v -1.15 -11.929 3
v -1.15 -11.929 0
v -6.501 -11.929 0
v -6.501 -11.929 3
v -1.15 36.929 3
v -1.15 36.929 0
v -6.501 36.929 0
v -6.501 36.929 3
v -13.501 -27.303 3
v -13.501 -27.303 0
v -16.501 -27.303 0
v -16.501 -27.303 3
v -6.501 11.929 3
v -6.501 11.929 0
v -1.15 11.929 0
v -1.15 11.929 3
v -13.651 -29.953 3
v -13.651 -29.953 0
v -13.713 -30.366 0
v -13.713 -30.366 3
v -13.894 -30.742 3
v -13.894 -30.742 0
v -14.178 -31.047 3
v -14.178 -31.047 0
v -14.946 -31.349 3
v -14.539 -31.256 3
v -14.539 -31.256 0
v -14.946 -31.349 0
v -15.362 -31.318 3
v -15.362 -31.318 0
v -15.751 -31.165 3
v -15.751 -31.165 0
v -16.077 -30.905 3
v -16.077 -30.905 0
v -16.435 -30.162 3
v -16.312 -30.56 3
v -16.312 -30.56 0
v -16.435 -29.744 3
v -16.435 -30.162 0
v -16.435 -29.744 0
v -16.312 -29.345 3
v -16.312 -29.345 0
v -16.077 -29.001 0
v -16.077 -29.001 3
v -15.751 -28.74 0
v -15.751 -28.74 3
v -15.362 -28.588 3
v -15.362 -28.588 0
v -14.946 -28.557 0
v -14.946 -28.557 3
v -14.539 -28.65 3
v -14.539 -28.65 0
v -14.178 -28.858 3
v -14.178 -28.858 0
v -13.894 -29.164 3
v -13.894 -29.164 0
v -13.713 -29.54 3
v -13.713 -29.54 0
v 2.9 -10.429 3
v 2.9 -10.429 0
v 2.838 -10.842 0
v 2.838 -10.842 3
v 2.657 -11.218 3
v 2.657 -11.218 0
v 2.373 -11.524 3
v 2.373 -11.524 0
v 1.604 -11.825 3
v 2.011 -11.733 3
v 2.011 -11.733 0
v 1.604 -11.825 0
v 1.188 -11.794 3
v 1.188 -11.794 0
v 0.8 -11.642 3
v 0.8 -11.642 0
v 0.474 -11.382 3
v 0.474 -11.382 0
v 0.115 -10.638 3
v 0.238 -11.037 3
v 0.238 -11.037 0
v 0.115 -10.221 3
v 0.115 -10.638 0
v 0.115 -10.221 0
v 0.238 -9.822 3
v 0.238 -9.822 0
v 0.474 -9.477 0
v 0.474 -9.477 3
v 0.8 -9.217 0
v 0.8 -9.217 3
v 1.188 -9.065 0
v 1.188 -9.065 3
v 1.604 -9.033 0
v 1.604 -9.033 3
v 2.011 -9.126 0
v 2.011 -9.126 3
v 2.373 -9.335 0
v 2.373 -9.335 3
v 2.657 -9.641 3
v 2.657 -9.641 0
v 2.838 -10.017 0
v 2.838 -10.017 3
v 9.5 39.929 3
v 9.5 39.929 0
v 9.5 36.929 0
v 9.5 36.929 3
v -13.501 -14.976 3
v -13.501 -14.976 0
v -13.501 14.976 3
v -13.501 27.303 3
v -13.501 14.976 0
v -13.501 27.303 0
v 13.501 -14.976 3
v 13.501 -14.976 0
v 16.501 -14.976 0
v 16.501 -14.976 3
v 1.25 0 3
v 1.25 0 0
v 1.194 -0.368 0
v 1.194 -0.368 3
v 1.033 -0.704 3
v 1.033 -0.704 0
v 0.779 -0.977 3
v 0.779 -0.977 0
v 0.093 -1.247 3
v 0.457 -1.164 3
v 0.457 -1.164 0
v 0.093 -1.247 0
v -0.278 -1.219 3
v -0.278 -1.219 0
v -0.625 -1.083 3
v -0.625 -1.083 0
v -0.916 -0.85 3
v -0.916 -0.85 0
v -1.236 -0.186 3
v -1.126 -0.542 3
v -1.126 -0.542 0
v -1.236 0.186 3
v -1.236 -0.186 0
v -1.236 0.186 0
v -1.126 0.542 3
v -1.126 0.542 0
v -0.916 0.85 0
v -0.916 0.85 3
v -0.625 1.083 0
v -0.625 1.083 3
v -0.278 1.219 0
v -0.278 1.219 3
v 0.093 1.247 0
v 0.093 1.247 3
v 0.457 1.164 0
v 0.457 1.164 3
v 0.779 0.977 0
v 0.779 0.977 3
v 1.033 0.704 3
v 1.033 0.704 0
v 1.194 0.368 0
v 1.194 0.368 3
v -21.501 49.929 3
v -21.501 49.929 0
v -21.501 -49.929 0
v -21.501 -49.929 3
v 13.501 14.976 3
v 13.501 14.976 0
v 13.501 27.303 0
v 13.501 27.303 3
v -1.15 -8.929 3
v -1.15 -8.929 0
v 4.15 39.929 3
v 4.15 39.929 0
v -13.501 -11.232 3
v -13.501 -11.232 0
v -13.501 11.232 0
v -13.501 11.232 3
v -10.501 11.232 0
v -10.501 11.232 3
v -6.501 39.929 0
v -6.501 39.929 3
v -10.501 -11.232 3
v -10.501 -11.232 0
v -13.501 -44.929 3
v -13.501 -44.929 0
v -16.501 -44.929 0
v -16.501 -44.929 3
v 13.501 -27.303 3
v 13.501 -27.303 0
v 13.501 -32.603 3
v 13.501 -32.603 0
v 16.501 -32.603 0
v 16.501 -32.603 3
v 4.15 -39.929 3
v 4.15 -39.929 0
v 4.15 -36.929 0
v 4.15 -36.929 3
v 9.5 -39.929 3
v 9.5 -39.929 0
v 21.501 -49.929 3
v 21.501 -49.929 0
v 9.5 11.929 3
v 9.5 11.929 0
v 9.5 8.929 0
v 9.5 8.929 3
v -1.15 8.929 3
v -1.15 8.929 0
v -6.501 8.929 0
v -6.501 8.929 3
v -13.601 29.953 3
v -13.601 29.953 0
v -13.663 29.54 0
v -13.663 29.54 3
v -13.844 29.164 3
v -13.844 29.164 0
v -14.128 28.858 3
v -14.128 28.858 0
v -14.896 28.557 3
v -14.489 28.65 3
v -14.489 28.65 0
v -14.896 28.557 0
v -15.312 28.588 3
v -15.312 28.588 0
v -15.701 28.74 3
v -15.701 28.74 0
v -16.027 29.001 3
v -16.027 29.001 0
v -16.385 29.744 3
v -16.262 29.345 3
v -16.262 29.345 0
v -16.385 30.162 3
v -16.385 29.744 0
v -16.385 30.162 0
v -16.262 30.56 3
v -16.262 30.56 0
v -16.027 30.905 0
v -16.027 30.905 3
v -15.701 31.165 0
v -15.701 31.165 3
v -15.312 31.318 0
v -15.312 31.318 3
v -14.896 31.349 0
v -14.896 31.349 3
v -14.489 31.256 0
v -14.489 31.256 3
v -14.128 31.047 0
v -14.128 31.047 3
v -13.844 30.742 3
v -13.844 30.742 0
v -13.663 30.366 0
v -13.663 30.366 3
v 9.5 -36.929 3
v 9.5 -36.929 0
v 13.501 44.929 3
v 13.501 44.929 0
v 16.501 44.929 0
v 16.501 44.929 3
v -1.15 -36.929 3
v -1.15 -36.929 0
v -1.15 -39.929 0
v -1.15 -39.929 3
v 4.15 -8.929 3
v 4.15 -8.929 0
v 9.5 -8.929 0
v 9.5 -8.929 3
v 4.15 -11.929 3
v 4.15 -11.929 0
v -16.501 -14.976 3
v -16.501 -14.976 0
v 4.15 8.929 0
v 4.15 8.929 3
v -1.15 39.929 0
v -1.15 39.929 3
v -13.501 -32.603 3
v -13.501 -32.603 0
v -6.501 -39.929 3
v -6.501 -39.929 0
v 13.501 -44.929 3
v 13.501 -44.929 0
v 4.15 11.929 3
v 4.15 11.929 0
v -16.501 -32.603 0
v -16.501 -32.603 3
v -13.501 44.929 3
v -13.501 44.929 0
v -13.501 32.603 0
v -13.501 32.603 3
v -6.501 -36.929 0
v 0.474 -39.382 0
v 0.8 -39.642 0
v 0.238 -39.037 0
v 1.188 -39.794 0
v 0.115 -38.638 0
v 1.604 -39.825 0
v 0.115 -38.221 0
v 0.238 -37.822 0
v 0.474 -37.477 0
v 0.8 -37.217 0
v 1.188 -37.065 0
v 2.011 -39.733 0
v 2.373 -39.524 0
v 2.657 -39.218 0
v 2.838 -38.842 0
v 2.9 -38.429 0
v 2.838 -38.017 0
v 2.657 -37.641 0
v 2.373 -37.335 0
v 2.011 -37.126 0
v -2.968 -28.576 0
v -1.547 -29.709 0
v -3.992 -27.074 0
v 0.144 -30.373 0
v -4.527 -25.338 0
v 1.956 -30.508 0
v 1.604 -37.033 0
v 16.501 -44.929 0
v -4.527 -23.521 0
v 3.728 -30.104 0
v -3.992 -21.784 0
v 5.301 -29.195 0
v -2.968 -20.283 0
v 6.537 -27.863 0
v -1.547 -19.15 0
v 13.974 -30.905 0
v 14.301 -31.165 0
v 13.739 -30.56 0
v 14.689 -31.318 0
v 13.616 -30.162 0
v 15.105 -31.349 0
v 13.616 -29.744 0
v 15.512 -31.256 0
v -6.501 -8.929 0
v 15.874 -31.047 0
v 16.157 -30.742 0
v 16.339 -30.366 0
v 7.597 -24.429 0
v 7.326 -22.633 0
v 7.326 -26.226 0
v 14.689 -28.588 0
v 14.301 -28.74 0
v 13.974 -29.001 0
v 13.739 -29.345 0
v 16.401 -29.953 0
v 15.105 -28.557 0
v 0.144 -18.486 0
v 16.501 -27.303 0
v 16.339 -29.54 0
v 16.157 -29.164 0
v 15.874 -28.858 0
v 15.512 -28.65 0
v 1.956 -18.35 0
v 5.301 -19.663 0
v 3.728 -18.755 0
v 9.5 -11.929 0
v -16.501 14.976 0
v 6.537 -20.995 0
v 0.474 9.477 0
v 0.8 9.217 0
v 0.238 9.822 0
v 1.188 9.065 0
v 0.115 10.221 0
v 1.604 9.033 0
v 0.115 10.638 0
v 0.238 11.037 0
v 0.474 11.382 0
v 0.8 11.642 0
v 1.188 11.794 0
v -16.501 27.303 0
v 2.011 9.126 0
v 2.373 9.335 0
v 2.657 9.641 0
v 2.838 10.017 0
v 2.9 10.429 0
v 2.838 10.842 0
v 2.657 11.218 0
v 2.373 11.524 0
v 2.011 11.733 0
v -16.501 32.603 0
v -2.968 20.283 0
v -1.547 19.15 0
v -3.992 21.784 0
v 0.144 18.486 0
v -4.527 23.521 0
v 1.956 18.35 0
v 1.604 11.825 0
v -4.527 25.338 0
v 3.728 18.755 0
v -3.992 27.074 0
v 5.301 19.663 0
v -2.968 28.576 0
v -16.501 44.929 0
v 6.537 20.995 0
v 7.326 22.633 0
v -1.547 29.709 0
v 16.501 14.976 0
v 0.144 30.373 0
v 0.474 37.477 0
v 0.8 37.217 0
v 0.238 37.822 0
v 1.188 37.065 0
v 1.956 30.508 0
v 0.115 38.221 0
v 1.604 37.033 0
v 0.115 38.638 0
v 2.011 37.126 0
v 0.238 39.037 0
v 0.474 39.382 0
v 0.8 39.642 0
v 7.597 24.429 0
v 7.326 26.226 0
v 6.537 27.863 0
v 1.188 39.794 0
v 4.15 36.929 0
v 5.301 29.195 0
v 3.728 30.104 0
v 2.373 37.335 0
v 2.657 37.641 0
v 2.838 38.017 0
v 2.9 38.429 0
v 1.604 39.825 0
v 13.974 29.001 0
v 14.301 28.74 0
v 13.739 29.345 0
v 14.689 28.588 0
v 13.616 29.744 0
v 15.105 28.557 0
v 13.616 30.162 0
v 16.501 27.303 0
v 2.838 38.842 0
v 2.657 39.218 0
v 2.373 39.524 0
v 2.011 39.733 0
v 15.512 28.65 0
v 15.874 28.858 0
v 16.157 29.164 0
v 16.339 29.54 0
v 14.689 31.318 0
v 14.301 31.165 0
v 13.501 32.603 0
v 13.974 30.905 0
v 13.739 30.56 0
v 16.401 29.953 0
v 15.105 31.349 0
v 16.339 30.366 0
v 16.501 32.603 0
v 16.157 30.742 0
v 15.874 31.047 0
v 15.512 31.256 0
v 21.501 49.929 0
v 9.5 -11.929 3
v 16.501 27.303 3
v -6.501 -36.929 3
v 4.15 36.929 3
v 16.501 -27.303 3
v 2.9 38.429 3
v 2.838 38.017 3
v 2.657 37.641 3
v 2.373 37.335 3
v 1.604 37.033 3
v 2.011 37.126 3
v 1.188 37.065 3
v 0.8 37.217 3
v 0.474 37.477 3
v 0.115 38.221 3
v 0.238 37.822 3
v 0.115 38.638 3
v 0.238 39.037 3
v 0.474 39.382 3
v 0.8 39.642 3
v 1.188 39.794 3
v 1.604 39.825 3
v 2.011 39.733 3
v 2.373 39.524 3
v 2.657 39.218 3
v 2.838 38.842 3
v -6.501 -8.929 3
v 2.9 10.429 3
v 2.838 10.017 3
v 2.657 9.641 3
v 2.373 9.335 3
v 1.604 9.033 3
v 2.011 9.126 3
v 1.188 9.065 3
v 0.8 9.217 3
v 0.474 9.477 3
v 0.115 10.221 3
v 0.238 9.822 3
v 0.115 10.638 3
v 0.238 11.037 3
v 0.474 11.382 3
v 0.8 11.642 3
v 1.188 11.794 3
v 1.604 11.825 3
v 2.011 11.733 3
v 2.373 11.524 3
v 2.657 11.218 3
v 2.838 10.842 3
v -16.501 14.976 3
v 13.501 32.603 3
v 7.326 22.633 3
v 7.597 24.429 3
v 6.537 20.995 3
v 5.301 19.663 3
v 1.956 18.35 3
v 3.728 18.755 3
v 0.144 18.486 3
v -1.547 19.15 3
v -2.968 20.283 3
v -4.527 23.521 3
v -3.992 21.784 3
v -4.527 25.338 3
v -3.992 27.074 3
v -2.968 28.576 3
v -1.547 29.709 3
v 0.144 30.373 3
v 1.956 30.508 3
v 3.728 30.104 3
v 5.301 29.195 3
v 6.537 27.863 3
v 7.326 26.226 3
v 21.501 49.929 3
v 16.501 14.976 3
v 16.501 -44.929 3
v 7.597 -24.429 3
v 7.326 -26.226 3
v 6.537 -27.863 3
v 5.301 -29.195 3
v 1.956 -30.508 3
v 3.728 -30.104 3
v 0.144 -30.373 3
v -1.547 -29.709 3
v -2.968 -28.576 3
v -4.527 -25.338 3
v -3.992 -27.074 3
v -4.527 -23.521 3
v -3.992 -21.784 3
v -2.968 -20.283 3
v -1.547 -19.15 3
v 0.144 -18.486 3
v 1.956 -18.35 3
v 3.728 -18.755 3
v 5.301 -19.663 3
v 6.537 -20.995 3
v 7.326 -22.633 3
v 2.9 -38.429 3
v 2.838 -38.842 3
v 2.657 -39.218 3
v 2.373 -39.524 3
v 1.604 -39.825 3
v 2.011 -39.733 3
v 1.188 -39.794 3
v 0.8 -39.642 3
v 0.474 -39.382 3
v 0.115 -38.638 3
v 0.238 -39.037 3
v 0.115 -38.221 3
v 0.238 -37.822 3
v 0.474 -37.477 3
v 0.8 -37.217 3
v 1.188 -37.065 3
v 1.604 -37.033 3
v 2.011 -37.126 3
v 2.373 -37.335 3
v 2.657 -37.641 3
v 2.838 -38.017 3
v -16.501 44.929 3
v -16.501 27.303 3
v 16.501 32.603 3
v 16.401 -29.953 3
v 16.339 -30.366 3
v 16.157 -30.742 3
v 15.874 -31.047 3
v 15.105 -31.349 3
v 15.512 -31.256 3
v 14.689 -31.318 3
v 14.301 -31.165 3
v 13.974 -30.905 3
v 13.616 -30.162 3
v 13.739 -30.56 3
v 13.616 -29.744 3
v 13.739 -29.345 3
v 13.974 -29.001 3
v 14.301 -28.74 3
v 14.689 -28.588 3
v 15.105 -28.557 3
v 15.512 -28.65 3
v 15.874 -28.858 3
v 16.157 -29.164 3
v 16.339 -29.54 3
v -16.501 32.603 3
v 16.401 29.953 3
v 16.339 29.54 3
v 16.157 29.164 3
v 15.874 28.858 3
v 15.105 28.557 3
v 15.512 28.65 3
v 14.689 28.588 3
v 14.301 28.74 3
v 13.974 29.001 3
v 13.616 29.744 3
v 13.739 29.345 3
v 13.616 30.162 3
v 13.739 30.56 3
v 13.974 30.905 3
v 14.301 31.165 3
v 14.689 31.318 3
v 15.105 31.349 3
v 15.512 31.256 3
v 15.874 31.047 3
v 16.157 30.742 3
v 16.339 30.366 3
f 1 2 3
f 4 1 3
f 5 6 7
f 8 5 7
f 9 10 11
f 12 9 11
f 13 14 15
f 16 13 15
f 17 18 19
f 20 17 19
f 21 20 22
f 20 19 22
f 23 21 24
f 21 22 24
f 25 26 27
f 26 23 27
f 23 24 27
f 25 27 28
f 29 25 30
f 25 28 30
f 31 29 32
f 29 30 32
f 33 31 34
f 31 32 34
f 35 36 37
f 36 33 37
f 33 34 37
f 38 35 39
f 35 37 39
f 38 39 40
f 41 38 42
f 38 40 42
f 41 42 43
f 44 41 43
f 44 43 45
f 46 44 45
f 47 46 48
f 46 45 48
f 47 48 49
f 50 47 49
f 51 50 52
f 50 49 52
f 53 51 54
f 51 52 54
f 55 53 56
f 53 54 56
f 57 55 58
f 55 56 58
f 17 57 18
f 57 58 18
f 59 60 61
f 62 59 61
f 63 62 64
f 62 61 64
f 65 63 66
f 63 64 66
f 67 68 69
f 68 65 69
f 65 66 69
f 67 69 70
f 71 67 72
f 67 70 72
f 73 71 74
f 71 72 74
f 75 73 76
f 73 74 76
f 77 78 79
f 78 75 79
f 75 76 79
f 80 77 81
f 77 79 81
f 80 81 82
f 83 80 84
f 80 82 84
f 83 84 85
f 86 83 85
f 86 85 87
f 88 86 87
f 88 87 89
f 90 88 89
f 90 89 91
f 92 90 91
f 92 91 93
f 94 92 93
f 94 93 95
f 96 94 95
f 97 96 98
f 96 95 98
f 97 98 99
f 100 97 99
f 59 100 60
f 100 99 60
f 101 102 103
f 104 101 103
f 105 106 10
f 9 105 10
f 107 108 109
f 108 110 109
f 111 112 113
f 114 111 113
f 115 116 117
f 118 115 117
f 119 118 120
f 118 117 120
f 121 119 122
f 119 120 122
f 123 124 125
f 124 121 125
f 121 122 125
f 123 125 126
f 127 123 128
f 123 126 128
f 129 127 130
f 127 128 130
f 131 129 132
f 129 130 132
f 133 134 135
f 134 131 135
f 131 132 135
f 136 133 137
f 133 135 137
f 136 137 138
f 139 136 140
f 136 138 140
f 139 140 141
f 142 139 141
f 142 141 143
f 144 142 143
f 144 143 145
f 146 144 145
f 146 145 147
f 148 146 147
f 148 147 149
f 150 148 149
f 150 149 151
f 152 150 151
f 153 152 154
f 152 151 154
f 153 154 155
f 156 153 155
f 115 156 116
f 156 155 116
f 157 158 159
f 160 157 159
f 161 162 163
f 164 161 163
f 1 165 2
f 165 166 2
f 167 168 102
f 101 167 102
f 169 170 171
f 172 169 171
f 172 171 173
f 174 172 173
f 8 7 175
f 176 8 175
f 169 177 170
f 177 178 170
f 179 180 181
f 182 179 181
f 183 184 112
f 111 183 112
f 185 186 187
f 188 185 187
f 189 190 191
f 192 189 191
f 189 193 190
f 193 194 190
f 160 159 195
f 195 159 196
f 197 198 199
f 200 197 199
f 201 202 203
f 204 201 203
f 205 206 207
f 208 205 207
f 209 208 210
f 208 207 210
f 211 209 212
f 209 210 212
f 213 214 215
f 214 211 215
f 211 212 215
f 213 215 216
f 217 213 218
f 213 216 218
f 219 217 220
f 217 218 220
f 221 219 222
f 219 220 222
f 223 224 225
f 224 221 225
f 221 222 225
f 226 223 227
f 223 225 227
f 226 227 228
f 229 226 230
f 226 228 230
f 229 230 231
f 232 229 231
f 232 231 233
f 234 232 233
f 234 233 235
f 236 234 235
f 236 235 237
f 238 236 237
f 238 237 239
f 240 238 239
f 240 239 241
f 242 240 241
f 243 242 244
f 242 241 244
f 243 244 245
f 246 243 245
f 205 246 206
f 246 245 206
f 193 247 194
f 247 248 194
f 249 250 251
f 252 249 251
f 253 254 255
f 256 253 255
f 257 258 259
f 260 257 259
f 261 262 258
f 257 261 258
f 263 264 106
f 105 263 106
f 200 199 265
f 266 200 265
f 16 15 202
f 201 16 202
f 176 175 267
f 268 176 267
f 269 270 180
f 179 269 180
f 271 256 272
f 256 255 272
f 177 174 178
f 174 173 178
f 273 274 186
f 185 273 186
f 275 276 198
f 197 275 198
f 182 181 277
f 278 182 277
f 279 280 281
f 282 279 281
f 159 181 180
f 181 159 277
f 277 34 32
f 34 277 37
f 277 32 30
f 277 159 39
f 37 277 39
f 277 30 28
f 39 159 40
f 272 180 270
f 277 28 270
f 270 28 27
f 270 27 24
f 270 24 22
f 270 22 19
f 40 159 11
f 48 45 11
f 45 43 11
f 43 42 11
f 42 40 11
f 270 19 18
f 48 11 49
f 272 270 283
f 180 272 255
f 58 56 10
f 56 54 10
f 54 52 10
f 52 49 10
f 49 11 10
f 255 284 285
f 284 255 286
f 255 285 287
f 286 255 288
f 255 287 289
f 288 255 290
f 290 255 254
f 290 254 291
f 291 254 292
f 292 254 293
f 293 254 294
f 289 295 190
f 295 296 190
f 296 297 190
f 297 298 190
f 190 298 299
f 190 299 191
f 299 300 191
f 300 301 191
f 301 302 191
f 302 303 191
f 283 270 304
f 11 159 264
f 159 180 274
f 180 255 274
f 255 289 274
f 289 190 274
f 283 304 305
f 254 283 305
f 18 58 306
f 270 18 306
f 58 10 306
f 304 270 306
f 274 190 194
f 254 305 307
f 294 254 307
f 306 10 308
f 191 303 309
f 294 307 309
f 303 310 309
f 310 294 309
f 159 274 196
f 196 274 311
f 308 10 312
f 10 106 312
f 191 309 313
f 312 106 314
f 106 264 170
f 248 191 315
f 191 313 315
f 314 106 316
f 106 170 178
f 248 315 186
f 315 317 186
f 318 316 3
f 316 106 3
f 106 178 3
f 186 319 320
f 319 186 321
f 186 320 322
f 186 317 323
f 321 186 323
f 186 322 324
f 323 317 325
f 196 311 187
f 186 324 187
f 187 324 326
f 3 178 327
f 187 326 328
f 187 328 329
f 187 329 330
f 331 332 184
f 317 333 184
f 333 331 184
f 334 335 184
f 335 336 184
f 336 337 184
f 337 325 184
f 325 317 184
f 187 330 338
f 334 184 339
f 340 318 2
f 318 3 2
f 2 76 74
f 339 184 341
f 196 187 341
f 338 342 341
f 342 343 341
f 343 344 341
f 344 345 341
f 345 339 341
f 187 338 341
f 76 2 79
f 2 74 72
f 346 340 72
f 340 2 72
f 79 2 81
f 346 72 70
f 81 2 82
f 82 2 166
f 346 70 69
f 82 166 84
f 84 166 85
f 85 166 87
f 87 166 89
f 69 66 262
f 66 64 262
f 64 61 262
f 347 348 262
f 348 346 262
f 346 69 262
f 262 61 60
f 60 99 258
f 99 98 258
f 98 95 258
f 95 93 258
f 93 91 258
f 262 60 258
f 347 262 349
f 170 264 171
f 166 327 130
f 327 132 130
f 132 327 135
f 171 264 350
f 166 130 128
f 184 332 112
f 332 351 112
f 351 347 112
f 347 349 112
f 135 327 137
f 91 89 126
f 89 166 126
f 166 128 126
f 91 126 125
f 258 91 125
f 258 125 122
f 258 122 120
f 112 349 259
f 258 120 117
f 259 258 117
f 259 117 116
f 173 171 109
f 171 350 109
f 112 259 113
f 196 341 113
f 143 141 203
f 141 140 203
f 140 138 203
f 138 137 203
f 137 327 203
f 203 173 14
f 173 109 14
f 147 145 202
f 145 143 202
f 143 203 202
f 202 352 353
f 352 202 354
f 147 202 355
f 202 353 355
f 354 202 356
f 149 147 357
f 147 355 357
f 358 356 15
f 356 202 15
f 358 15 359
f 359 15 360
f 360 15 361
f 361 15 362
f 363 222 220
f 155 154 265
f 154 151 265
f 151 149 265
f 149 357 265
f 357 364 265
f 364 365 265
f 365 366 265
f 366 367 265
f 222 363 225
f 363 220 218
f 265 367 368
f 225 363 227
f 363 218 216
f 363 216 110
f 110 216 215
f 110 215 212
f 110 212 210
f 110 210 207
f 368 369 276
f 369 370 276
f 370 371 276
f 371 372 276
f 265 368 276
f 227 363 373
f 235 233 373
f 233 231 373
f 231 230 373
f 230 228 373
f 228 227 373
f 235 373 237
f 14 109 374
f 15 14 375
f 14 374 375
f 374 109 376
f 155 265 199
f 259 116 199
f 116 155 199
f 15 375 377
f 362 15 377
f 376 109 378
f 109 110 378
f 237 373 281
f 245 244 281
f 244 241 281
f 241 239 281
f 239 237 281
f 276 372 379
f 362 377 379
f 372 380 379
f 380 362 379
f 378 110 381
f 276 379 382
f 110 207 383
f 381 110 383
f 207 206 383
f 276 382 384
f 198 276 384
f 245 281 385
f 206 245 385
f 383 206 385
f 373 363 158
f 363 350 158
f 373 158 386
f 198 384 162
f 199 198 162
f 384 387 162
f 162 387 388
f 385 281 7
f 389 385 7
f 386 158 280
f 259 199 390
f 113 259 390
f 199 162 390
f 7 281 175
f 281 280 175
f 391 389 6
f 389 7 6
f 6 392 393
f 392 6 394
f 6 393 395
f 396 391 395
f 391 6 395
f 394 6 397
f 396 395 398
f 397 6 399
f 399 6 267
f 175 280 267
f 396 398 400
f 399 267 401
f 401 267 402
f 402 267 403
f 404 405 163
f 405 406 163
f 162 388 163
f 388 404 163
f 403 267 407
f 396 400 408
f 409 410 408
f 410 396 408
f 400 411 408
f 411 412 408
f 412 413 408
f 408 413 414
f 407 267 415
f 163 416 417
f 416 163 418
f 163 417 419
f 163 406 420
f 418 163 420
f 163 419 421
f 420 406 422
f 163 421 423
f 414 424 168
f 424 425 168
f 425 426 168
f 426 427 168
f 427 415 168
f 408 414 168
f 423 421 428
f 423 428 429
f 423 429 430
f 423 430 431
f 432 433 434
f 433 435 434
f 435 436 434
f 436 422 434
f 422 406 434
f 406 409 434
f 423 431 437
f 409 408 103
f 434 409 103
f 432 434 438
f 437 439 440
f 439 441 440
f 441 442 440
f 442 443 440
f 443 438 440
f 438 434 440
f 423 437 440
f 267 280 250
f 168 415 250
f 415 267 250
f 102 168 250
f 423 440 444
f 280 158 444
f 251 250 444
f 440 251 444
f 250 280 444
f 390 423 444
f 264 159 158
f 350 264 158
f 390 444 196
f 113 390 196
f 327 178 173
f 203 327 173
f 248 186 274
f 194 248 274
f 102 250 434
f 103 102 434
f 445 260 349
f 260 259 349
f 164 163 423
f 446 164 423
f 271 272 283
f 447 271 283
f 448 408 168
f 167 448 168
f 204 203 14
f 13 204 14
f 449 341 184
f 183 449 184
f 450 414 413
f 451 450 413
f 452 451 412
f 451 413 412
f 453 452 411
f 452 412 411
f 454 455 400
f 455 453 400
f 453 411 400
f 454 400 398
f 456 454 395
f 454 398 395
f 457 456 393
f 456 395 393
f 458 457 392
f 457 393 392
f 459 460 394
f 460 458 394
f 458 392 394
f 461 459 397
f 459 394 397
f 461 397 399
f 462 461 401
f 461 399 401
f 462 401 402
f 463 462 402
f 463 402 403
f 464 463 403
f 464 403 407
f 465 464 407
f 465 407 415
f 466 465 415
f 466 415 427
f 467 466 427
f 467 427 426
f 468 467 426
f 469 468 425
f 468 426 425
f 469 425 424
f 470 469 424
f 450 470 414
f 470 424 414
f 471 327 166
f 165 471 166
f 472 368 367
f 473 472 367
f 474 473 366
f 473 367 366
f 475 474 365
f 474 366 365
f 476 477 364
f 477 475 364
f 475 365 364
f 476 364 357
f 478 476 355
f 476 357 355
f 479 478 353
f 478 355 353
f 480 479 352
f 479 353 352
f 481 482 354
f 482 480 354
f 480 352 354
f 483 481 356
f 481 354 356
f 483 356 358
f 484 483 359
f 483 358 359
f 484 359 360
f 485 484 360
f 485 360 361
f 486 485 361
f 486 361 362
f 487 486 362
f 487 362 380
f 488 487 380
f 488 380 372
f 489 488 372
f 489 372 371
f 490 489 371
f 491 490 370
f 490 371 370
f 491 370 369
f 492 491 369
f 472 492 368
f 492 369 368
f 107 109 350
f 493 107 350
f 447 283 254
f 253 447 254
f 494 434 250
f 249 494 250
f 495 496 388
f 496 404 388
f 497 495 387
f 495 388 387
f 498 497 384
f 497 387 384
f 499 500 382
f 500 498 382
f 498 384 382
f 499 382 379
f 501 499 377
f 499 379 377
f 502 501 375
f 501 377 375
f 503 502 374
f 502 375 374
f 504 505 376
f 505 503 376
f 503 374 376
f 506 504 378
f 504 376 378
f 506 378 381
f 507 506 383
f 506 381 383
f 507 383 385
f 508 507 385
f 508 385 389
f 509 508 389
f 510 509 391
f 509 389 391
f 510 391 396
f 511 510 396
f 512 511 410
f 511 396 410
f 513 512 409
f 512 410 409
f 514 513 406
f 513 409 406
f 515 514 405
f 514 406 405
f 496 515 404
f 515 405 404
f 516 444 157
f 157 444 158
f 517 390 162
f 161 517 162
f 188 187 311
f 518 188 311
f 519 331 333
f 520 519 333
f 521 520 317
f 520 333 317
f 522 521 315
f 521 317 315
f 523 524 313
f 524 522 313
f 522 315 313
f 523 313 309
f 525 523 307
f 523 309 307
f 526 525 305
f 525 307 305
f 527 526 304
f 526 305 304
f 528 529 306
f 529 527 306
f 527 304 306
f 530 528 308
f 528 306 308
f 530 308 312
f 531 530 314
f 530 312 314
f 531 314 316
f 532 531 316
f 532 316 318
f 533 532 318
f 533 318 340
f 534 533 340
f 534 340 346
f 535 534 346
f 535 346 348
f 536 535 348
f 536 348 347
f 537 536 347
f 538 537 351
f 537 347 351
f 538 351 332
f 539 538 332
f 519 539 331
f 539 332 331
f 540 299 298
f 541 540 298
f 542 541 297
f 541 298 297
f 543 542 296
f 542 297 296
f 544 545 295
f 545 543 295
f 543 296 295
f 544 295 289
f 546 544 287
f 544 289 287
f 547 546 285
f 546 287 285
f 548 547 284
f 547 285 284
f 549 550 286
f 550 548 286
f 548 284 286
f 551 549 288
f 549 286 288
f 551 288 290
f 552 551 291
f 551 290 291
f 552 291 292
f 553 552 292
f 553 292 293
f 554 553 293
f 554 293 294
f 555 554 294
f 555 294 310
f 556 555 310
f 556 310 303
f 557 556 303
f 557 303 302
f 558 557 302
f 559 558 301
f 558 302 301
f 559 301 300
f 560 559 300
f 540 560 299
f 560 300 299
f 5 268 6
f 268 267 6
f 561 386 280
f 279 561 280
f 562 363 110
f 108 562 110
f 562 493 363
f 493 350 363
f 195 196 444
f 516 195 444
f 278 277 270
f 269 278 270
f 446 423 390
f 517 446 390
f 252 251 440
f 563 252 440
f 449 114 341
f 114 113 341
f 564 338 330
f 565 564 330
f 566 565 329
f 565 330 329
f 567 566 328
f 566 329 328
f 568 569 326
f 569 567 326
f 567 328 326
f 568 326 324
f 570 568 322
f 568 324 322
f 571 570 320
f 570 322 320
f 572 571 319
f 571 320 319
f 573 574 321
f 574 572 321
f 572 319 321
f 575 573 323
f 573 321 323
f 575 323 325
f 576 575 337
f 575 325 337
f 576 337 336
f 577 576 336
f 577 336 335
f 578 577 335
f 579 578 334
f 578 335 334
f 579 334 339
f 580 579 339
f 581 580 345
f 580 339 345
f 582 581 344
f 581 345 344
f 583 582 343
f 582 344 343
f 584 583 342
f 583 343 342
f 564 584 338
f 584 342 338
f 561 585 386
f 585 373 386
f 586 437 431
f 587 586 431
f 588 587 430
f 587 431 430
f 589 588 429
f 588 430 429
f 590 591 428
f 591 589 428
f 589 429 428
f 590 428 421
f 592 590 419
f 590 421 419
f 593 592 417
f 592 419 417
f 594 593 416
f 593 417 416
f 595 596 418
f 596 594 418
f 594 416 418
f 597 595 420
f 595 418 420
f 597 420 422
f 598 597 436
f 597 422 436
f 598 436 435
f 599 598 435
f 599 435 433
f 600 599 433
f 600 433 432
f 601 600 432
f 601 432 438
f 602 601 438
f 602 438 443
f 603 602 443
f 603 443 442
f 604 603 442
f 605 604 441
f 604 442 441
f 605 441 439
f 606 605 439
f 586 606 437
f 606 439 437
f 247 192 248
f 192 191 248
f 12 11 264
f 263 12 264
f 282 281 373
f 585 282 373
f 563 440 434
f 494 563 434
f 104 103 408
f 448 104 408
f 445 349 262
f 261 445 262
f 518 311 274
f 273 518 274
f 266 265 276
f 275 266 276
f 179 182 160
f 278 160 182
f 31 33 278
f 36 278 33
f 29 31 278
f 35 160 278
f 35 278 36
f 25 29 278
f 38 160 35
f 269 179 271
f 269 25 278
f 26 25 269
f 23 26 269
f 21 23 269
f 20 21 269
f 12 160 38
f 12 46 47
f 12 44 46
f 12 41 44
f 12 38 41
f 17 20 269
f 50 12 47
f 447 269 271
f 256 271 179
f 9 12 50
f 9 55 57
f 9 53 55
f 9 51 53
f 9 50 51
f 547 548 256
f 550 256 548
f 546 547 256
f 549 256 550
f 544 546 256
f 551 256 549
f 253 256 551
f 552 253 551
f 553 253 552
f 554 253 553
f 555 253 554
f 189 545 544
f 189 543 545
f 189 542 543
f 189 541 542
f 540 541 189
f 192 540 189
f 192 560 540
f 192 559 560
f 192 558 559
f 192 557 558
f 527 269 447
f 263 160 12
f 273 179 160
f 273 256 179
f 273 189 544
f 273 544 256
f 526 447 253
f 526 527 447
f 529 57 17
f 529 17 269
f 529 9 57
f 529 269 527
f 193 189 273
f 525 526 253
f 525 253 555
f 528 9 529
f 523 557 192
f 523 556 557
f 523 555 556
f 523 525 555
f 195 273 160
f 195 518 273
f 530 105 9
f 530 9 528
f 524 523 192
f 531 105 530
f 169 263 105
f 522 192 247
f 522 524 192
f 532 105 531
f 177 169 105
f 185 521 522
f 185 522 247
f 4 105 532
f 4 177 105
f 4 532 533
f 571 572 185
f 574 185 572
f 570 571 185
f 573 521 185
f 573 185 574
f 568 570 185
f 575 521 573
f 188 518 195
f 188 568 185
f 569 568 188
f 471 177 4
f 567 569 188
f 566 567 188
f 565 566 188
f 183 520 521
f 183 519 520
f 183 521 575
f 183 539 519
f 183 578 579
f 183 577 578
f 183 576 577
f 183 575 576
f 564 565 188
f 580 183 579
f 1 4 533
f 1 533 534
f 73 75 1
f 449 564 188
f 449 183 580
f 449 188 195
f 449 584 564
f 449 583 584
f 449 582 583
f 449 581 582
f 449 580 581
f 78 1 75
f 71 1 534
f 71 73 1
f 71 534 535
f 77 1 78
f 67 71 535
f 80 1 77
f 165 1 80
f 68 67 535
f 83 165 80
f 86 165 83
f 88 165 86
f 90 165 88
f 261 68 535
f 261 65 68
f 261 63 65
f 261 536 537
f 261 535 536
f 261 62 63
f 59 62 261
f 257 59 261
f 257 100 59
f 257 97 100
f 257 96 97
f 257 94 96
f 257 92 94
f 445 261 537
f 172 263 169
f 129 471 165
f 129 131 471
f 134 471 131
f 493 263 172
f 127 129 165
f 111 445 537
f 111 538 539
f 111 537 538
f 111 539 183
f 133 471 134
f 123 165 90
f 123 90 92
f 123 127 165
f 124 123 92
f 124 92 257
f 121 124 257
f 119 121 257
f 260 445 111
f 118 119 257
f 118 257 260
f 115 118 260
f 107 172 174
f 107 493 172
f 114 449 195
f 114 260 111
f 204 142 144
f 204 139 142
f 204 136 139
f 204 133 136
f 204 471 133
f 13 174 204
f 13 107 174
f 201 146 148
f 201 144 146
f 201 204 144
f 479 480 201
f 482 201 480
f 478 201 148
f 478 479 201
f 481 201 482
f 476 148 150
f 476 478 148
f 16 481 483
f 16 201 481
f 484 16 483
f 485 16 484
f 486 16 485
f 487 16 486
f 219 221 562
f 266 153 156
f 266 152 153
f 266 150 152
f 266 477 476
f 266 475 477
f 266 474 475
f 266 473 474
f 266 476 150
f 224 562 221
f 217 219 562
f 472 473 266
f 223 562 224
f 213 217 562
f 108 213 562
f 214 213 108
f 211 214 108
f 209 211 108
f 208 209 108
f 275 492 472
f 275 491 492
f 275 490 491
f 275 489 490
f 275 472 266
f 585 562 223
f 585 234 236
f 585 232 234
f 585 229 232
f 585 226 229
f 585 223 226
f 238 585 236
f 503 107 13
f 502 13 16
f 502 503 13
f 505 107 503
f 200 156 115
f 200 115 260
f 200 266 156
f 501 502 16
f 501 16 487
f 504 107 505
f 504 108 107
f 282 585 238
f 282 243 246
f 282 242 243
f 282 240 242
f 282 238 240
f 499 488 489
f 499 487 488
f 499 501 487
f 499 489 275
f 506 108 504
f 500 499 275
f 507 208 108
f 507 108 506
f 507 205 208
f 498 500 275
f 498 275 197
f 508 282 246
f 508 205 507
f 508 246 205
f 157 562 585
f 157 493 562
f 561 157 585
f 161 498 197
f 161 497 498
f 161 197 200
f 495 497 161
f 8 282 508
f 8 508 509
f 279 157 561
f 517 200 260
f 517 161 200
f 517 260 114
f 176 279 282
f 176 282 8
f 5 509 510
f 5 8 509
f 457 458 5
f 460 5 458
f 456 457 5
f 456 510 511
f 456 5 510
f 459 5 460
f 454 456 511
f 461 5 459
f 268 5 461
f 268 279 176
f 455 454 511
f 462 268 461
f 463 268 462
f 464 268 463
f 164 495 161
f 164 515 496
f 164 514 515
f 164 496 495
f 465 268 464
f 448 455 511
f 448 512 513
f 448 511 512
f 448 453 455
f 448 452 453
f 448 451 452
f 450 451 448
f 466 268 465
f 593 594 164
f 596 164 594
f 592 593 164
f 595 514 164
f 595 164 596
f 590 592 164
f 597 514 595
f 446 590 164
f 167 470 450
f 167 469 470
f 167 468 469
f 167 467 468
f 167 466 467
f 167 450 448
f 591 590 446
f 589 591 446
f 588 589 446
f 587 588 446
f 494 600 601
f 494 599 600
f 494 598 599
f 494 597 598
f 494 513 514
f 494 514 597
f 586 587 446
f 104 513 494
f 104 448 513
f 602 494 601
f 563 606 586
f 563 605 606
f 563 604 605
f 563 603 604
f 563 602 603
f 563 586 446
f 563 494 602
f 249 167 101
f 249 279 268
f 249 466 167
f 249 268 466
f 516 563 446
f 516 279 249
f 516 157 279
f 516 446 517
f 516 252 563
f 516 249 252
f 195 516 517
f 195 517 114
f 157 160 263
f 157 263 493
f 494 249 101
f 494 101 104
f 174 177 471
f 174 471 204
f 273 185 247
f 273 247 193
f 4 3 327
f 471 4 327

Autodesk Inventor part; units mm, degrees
ref_plane "YZ Plane" through (0, 0, 0) normal (1, 0, 0) x (0, 1, 0)
ref_plane "XZ Plane" through (0, 0, 0) normal (0, 1, 0) x (-1, 0, 0)
ref_plane "XY Plane" through (0, 0, 0) normal (0, 0, 1) x (1, 0, 0)
sketch "Sketch1" plane through (0, 0, 0) normal (0, 0, 1) x (1, 0, 0)
  line L0 (21.5007, 49.9294) -> (-21.5007, 49.9294)
  line L1 (-21.5007, 49.9294) -> (-21.5007, -49.9294)
  line L2 (-21.5007, -49.9294) -> (21.5007, -49.9294)
  line L3 (21.5007, -49.9294) -> (21.5007, 49.9294)
  line L4 (-13.5007, 14.9765) -> (-16.5007, 14.9765)
  line L5 (-16.5007, 14.9765) -> (-16.5007, 27.3029)
  line L6 (-16.5007, 27.3029) -> (-13.5007, 27.3029)
  line L7 (-13.5007, 27.3029) -> (-13.5007, 14.9765)
  line L8 (-13.5007, -27.3029) -> (-16.5007, -27.3029)
  line L9 (-16.5007, -27.3029) -> (-16.5007, -14.9765)
  line L10 (-16.5007, -14.9765) -> (-13.5007, -14.9765)
  line L11 (-13.5007, -14.9765) -> (-13.5007, -27.3029)
  line L12 (-13.5007, -44.9294) -> (-16.5007, -44.9294)
  line L13 (-16.5007, -44.9294) -> (-16.5007, -32.6029)
  line L14 (-16.5007, -32.6029) -> (-13.5007, -32.6029)
  line L15 (-13.5007, -32.6029) -> (-13.5007, -44.9294)
  line L16 (-16.5007, 44.9294) -> (-13.5007, 44.9294)
  line L17 (-13.5007, 44.9294) -> (-13.5007, 32.6029)
  line L18 (-13.5007, 32.6029) -> (-16.5007, 32.6029)
  line L19 (-16.5007, 32.6029) -> (-16.5007, 44.9294)
  line L20 (-10.5007, -11.2324) -> (-13.5007, -11.2324)
  line L21 (-13.5007, -11.2324) -> (-13.5007, 11.2324)
  line L22 (-13.5007, 11.2324) -> (-10.5007, 11.2324)
  line L23 (-10.5007, 11.2324) -> (-10.5007, -11.2324)
  line L24 (16.5007, 14.9765) -> (13.5007, 14.9765)
  line L25 (13.5007, 14.9765) -> (13.5007, 27.3029)
  line L26 (13.5007, 27.3029) -> (16.5007, 27.3029)
  line L27 (16.5007, 27.3029) -> (16.5007, 14.9765)
  line L28 (16.5007, -27.3029) -> (13.5007, -27.3029)
  line L29 (13.5007, -27.3029) -> (13.5007, -14.9765)
  line L30 (13.5007, -14.9765) -> (16.5007, -14.9765)
  line L31 (16.5007, -14.9765) -> (16.5007, -27.3029)
  line L32 (16.5007, -44.9294) -> (13.5007, -44.9294)
  line L33 (13.5007, -44.9294) -> (13.5007, -32.6029)
  line L34 (13.5007, -32.6029) -> (16.5007, -32.6029)
  line L35 (16.5007, -32.6029) -> (16.5007, -44.9294)
  line L36 (13.5007, 44.9294) -> (16.5007, 44.9294)
  line L37 (16.5007, 44.9294) -> (16.5007, 32.6029)
  line L38 (16.5007, 32.6029) -> (13.5007, 32.6029)
  line L39 (13.5007, 32.6029) -> (13.5007, 44.9294)
  line L40 (4.1498, 36.9294) -> (4.1498, 39.9294)
  line L41 (4.1498, 39.9294) -> (9.5001, 39.9294)
  line L42 (9.5001, 39.9294) -> (9.5001, 36.9294)
  line L43 (9.5001, 36.9294) -> (4.1498, 36.9294)
  line L44 (-6.5006, 36.9294) -> (-6.5006, 39.9294)
  line L45 (-6.5006, 39.9294) -> (-1.1502, 39.9294)
  line L46 (-1.1502, 39.9294) -> (-1.1502, 36.9294)
  line L47 (-1.1502, 36.9294) -> (-6.5006, 36.9294)
  line L48 (-1.1502, 11.9294) -> (-1.1502, 8.9294)
  line L49 (-1.1502, 8.9294) -> (-6.5006, 8.9294)
  line L50 (-6.5006, 8.9294) -> (-6.5006, 11.9294)
  line L51 (-6.5006, 11.9294) -> (-1.1502, 11.9294)
  line L52 (9.5001, 11.9294) -> (9.5001, 8.9294)
  line L53 (9.5001, 8.9294) -> (4.1498, 8.9294)
  line L54 (4.1498, 8.9294) -> (4.1498, 11.9294)
  line L55 (4.1498, 11.9294) -> (9.5001, 11.9294)
  line L56 (4.1498, -11.9294) -> (4.1498, -8.9294)
  line L57 (4.1498, -8.9294) -> (9.5001, -8.9294)
  line L58 (9.5001, -8.9294) -> (9.5001, -11.9294)
  line L59 (9.5001, -11.9294) -> (4.1498, -11.9294)
  line L60 (-6.5006, -11.9294) -> (-6.5006, -8.9294)
  line L61 (-6.5006, -8.9294) -> (-1.1502, -8.9294)
  line L62 (-1.1502, -8.9294) -> (-1.1502, -11.9294)
  line L63 (-1.1502, -11.9294) -> (-6.5006, -11.9294)
  line L64 (4.1498, -39.9294) -> (4.1498, -36.9294)
  line L65 (4.1498, -36.9294) -> (9.5001, -36.9294)
  line L66 (9.5001, -36.9294) -> (9.5001, -39.9294)
  line L67 (9.5001, -39.9294) -> (4.1498, -39.9294)
  line L68 (-6.5006, -39.9294) -> (-6.5006, -36.9294)
  line L69 (-6.5006, -36.9294) -> (-1.1502, -36.9294)
  line L70 (-1.1502, -36.9294) -> (-1.1502, -39.9294)
  line L71 (-1.1502, -39.9294) -> (-6.5006, -39.9294)
  circle A0 centre (1.4998, 38.4294) radius 1.4
  line L72 (1.4998, 41.6656) -> (1.4998, 35.5125) construction
  circle A1 centre (1.4998, 10.4294) radius 1.4
  circle A2 centre (1.4998, -10.4294) radius 1.4
  circle A3 centre (1.4998, -38.4294) radius 1.4
  line L73 (-16.5007, 29.9529) -> (-13.5007, 29.9529) construction
  circle A4 centre (-15.0007, 29.9529) radius 1.4
  circle A5 centre (15.0007, 29.9529) radius 1.4
  line L74 (-16.5007, -29.9529) -> (-13.6007, -29.9529) construction
  circle A6 centre (-15.0507, -29.9529) radius 1.4
  circle A7 centre (15.0007, -29.9529) radius 1.4
  circle A8 centre (1.5007, -24.4294) radius 6.096
  circle A9 centre (1.5007, 24.4294) radius 6.096
  circle A10 centre (0, 0) radius 1.25
  dimension "d5" = 99.8588
  dimension "d6" = 43.0015
  dimension "d7" = 2.8
  dimension "d8" = 5.3
  dimension "d9" = 2.65
  dimension "d10" = 2.8
  dimension "d11" = 2.8
  dimension "d12" = 2.8
  dimension "d13" = 2.8
  dimension "d14" = 2.8
  dimension "d15" = 5.3
  dimension "d16" = 2.65
  dimension "d17" = 5.3
  dimension "d18" = 2.65
  dimension "d19" = 2.8
  dimension "d20" = 2.8
  dimension "d22" = 2.5
extrude "Extrusion1" add sketch "Sketch1" along normal blind 3
equation "\"d9\" = 0.5 * d8"
equation "\"d16\" = 0.5 * d15"
equation "\"d18\" = 0.5 * d17"
properties part number "X-Anchor-Side"
